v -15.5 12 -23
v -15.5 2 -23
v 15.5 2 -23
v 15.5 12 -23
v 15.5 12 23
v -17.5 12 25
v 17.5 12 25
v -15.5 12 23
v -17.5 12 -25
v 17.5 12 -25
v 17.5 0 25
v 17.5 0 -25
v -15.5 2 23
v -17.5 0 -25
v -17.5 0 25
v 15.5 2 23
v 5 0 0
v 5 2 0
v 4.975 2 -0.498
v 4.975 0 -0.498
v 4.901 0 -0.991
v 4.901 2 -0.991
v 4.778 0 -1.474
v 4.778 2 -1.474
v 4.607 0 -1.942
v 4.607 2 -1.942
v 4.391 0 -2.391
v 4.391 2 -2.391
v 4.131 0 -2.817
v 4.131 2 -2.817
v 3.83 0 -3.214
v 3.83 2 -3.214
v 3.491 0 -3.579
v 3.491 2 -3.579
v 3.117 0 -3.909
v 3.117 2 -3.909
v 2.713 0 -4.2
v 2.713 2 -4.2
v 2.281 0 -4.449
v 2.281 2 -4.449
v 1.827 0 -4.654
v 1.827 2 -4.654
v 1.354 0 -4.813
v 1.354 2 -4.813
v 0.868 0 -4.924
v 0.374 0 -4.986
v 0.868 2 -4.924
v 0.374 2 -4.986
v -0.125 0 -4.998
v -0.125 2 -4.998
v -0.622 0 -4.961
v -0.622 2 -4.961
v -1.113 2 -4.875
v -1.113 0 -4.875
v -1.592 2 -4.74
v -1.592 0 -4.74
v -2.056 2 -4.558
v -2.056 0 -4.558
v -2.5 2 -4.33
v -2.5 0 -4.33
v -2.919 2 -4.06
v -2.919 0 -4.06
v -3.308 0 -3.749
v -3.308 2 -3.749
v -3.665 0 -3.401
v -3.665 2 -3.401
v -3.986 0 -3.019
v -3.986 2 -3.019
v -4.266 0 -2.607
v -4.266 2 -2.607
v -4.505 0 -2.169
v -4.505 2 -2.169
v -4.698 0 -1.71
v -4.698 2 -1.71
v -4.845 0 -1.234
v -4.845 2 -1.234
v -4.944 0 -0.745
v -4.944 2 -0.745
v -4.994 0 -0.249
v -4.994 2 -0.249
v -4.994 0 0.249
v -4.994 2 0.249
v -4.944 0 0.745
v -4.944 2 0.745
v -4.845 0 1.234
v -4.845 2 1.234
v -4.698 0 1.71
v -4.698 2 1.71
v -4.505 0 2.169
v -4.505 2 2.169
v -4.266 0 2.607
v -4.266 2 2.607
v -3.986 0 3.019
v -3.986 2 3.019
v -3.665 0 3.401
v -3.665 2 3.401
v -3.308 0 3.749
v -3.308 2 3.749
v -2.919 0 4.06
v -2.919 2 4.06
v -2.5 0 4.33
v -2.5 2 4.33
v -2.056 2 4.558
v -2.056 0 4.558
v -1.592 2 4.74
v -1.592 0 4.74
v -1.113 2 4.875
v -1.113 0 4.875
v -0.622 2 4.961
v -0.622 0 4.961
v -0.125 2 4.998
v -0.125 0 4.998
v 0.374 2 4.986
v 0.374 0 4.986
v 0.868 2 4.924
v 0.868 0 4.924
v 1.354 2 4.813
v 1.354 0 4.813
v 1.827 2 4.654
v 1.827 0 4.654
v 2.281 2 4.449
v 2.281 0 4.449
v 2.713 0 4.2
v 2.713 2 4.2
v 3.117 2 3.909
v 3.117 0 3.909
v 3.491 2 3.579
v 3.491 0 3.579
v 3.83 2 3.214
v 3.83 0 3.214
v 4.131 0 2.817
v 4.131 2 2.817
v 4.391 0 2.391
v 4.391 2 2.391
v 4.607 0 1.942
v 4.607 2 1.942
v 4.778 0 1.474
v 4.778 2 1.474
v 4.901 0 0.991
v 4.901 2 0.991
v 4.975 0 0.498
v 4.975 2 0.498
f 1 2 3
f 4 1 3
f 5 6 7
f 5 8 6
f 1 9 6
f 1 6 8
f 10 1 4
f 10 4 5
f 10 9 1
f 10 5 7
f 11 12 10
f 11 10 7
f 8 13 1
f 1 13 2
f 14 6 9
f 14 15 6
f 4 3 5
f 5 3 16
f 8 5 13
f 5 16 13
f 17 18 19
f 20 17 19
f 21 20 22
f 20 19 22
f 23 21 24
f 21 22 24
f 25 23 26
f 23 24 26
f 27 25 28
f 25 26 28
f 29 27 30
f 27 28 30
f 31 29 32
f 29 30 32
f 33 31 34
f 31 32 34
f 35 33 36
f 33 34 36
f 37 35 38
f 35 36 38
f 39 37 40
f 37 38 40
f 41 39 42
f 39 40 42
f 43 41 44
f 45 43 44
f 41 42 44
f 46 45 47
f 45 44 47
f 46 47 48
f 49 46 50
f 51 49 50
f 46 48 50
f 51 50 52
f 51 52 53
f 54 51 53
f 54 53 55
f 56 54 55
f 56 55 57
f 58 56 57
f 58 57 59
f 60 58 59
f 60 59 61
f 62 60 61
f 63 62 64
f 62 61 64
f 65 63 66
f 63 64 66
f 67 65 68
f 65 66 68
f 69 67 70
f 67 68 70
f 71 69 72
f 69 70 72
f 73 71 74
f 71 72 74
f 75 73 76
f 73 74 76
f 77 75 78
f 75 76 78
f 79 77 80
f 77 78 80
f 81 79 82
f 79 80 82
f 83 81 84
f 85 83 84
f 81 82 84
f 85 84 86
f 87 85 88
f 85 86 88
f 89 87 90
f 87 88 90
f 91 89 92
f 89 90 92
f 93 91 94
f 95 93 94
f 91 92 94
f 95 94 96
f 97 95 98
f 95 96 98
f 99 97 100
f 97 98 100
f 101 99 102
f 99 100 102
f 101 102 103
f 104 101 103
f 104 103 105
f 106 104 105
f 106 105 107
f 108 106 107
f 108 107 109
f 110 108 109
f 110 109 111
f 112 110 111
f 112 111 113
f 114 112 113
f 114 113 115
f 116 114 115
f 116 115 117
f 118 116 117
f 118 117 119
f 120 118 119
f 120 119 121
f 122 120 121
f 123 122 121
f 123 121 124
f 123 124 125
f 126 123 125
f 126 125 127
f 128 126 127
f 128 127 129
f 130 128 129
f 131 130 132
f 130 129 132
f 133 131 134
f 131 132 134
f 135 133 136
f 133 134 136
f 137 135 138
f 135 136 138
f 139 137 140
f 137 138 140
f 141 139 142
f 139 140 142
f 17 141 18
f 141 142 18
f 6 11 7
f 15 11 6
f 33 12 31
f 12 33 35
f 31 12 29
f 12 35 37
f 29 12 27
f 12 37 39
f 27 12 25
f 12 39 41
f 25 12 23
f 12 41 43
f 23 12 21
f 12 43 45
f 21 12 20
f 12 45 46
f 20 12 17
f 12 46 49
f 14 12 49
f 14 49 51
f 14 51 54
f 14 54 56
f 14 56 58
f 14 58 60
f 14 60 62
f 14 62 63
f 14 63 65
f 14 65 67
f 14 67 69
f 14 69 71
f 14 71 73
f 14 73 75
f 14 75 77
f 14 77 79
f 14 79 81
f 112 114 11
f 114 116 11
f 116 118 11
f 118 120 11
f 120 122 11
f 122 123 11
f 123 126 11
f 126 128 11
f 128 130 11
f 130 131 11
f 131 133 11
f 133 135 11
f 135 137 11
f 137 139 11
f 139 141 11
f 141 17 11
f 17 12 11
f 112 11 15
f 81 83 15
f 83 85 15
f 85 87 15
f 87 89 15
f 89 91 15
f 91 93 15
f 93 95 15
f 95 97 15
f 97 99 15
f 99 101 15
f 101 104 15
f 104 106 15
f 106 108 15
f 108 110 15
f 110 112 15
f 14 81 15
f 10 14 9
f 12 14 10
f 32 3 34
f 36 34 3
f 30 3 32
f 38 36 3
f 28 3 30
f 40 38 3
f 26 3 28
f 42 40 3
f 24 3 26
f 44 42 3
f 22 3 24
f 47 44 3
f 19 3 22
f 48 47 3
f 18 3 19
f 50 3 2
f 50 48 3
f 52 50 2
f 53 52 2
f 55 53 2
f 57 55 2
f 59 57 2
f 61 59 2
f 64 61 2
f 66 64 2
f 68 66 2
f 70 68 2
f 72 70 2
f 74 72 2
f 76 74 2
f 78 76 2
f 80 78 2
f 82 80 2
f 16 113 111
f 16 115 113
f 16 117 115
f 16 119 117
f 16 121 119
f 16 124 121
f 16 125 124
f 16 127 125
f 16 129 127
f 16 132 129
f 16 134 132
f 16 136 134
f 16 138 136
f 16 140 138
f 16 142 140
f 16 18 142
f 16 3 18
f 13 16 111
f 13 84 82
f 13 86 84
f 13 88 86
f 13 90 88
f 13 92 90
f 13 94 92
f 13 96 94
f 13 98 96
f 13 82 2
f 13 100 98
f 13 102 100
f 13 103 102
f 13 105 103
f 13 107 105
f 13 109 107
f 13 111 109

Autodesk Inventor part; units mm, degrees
ref_plane "РабПлоскость1" through (0, -35, 0) normal (0, 1, 0) x (-1, 0, 0)
ref_plane "РабПлоскость25" through (100, -155, 0) normal (-1, 0, 0) x (0, 0, 1)
ref_plane "РабПлоскость26" through (84, -165, -19) normal (-1, 0, 0) x (0, 0, 1)
sketch "Эскиз130" plane through (0, 0, 0) normal (0, 1, 0) x (-1, 0, 0)
  line L0 (-17.5, 25) -> (17.5, 25)
  line L1 (17.5, 25) -> (17.5, -25)
  line L2 (17.5, -25) -> (-17.5, -25)
  line L3 (-17.5, -25) -> (-17.5, 25)
  line L4 (-17.5, 25) -> (17.5, -25) construction
  line L5 (17.5, 25) -> (-17.5, -25) construction
  point P0 (0, 0)
  dimension "d710" = 50
  dimension "d711" = 35
extrude "Выдавливание115" add sketch "Эскиз130" along normal blind 2
sketch "Эскиз131" plane through (0, 2, 0) normal (0, 1, 0) x (1, 0, 0)
  line L0 (15.5, -23) -> (-15.5, -23)
  line L1 (-15.5, -23) -> (-15.5, 23)
  line L2 (-15.5, 23) -> (15.5, 23)
  line L3 (15.5, 23) -> (15.5, -23)
  line L4 (15.5, -23) -> (-15.5, 23) construction
  line L5 (-15.5, -23) -> (15.5, 23) construction
  line L6 (-17.5, 25) -> (-17.5, -25) projected
  line L7 (17.5, 25) -> (-17.5, 25) projected
  line L8 (-17.5, -25) -> (17.5, -25) projected
  line L9 (17.5, -25) -> (17.5, 25) projected
  line L10 (-17.5, -25) -> (17.5, -25) projected
  line L11 (17.5, -25) -> (17.5, 25) projected
  line L12 (17.5, 25) -> (-17.5, 25) projected
  line L13 (-17.5, 25) -> (-17.5, -25) projected
  point P0 (0, 0)
  dimension "d714" = 2
  dimension "d715" = 2
extrude "Выдавливание116" add sketch "Эскиз131" along normal blind 10
sketch "Эскиз132" plane through (0, 2, 0) normal (0, 1, 0) x (1, 0, 0)
  circle A0 centre (0, 0) radius 5
  dimension "d718" = 10
  dimension "d12" = 100
  dimension "d14" = 17
  dimension "d26" = 5
extrude "Выдавливание117" cut sketch "Эскиз132" against normal blind 10
sketch "Эскиз6" plane through (0, -35, -85) normal (0, -1, 0) x (1, 0, 0)
  arc A0 (29.3991, 164.4544) -> (0, 170) centre (-5, 62.7941) ccw projected
  line L0 (0, 170) -> (0, 0) projected
  arc A1 (0, 0) -> (29.3991, 5.5456) centre (-5, 107.2059) ccw projected
  arc A2 (29.3991, 5.5456) -> (100, 85) centre (-5, 107.2059) ccw projected
  arc A3 (100, 85) -> (29.3991, 164.4544) centre (-5, 62.7941) ccw projected
  point P0 (0, 85)
sketch "Эскиз114" plane through (2, -165, 82.8837) normal (1, 0, 0) x (0, 0, -1)
  circle A0 centre (120.1897, 5) radius 1
  line L0 (-2.1163, 0) -> (167.8837, 0) construction
  line L1 (82.8837, 0) -> (82.8837, 60.2174) construction
  circle A1 centre (45.5777, 5) radius 1
  point P0 (82.8837, 165)
  dimension "d609" = 2
  dimension "d610" = 37.306
  dimension "d611" = 5
sketch "Эскиз115" plane through (2, -165, 82.8837) normal (1, 0, 0) x (0, 0, -1)
  line L0 (167.7717, 0) -> (0, 0) construction
  line L1 (82.8837, 130) -> (82.8837, 0) construction
  line L2 (63.8837, 0) -> (101.8837, 0)
  line L3 (101.8837, 0) -> (101.8837, 20)
  line L4 (101.8837, 20) -> (63.8837, 20)
  line L5 (63.8837, 20) -> (63.8837, 0)
  line L6 (65.8837, 2) -> (99.8837, 2)
  line L7 (99.8837, 2) -> (99.8837, 18)
  line L8 (99.8837, 18) -> (65.8837, 18)
  line L9 (65.8837, 18) -> (65.8837, 2)
  line L10 (65.8837, 2) -> (99.8837, 18) construction
  line L11 (99.8837, 2) -> (65.8837, 18) construction
  point P0 (82.8837, 165)
  point P1 (145.8837, 0)
  point P2 (82.8837, 20)
  point P3 (82.8837, 10)
  dimension "d614" = 38
  dimension "d615" = 20
  dimension "d616" = 2
  dimension "d617" = 2
  dimension "d618" = 2
sketch "Эскиз116" plane through (0, -165, -85) normal (0, -1, 0) x (1, 0, 0)
  arc A0 (91.9272, 104) -> (2, 167.8837) centre (-5, 62.7941) ccw construction
  arc A1 (97.9549, 85) -> (92.7533, 102) centre (-5, 62.7941) ccw construction
  arc A2 (97.9549, 85) -> (91.9272, 104) centre (-5, 62.7941) ccw construction
  arc A3 (91.9272, 66) -> (97.9549, 85) centre (-5, 107.206) ccw
  line L0 (2, 66) -> (100.2736, 66) construction
  arc A4 (100.2736, 66) -> (97.9549, 85) centre (-5, 62.7941) ccw projected
  line L1 (91.9272, 66) -> (100.2736, 66)
  point P0 (0, 85)
  point P1 (36.5, 159.5958)
  dimension "d621" = 22.206
sketch "Эскиз117" plane through (2, -165, 82.8837) normal (1, 0, 0) x (0, 0, -1)
  line L0 (101.8837, 20) -> (101.8837, 0) projected
  line L1 (63.8837, 20) -> (101.8837, 20) projected
  line L2 (63.8837, 0) -> (63.8837, 20) projected
  line L3 (63.8837, 0) -> (101.8837, 0)
  point P0 (82.8837, 165)
sketch "Эскиз118" plane through (0, -165, -85) normal (0, -1, 0) x (1, 0, 0)
  line L0 (2, 66) -> (2, 104) projected
  line L1 (2, 66) -> (91.9272, 66) projected
  arc A0 (91.9272, 66) -> (97.9549, 85) centre (-5, 107.206) ccw projected
  line L2 (97.9549, 85) -> (100, 85) projected
  arc A1 (100, 85) -> (94.0968, 104) centre (-5, 62.7941) ccw projected
  line L3 (2, 104) -> (94.0968, 104) projected
  line L4 (2, 104) -> (4, 104)
  line L5 (4, 104) -> (4, 66)
  line L6 (4, 66) -> (2, 66)
  line L7 (2, 66) -> (2, 104)
  point P0 (0, 85)
  dimension "d626" = 2
sketch "Эскиз119" plane through (0, -165, -85) normal (0, -1, 0) x (1, 0, 0)
  arc A0 (100, 85) -> (94.0968, 104) centre (-5, 62.7941) ccw construction
  line L0 (4, 104) -> (4, 66) construction
  line L1 (4, 85) -> (65.3021, 85) construction
  arc A1 (94.0968, 66) -> (100, 85) centre (-5, 107.2059) ccw
  arc A2 (91.9272, 66) -> (97.9549, 85) centre (-5, 107.206) ccw construction
  line L2 (100, 85) -> (97.9549, 85)
  line L3 (94.0968, 66) -> (91.9272, 66)
  arc A3 (91.9272, 66) -> (97.9549, 85) centre (-5, 107.206) ccw
  point P0 (0, 85)
sketch "Эскиз120" plane through (4, -147, 17) normal (0, -1, 0) x (1, 0, 0)
  line L0 (0, 0) -> (2, 0)
  line L1 (2, 0) -> (2, -34)
  line L2 (2, -34) -> (0, -34)
  line L3 (0, -34) -> (0, 0)
  point P0 (-4, -17)
  dimension "d631" = 2
sketch "Эскиз121" plane through (0, 0, 0) normal (1, 0, 0) x (0, 1, 0)
  line L0 (-145, -19) -> (-145, 19) construction
  line L1 (-165, -19) -> (-145, -19) construction
  line L2 (-165, 19) -> (-165, -19) construction
  line L3 (-145, 19) -> (-165, 19) construction
  line L4 (-158, -19) -> (-152, -19)
  line L5 (-152, -19) -> (-152, -25)
  line L6 (-152, -25) -> (-158, -25)
  line L7 (-158, -25) -> (-158, -19)
  circle A0 centre (-155, -22) radius 1
  line L8 (-158, 25) -> (-152, 25)
  line L9 (-152, 25) -> (-152, 19)
  line L10 (-152, 19) -> (-158, 19)
  line L11 (-158, 19) -> (-158, 25)
  circle A1 centre (-155, 22) radius 1
  line L12 (-155, 19) -> (-155, -19) construction
  point P0 (0, 0)
  dimension "d634" = 6
  dimension "d635" = 6
  dimension "d636" = 2
  dimension "d637" = 3
  dimension "d638" = 3
  dimension "d639" = 6
  dimension "d640" = 6
  dimension "d641" = 2
  dimension "d642" = 3
  dimension "d643" = 3
sketch "Эскиз122" plane through (0, -158, 19) normal (0, -1, 0) x (1, 0, 0)
  line L0 (0, 0) -> (0, 6) projected
  line L1 (0, 0) -> (4, 0) projected
  line L2 (6, 0) -> (4, 0) projected
  line L3 (6, 6) -> (6, 0) projected
  line L4 (0, 6) -> (6, 6) projected
  line L5 (0, -44) -> (0, -38) projected
  line L6 (0, -44) -> (6, -44) projected
  line L7 (6, -38) -> (6, -44) projected
  line L8 (4, -38) -> (6, -38) projected
  line L9 (0, -38) -> (4, -38) projected
  line L10 (0, 6) -> (4, 6)
  line L11 (4, 6) -> (4, -44)
  line L12 (4, -44) -> (0, -44)
  line L13 (0, -44) -> (0, 6)
  line L14 (0, -44) -> (6, -44) projected
  point P0 (0, -19)
  dimension "d646" = 4
sketch "Эскиз123" plane through (0, -165, -85) normal (0, -1, 0) x (1, 0, 0)
  line L0 (32, 66) -> (34, 66)
  line L1 (34, 66) -> (34, 63)
  line L2 (34, 63) -> (32, 63)
  line L3 (32, 63) -> (32, 66)
  line L4 (4, 104) -> (4, 66) projected
  line L5 (94.0968, 66) -> (4, 66) projected
  line L6 (32, 107) -> (34, 107)
  line L7 (34, 107) -> (34, 104)
  line L8 (34, 104) -> (32, 104)
  line L9 (32, 104) -> (32, 107)
  line L10 (4, 104) -> (94.0968, 104) projected
  line L11 (36.5, 107) -> (38.5, 107)
  line L12 (38.5, 107) -> (38.5, 104)
  line L13 (38.5, 104) -> (36.5, 104)
  line L14 (36.5, 104) -> (36.5, 107)
  line L15 (36.5, 66) -> (38.5, 66)
  line L16 (38.5, 66) -> (38.5, 63)
  line L17 (38.5, 63) -> (36.5, 63)
  line L18 (36.5, 63) -> (36.5, 66)
  point P0 (0, 85)
  dimension "d650" = 30
  dimension "d651" = 2
  dimension "d652" = 3
  dimension "d653" = 2
  dimension "d654" = 3
  dimension "d655" = 2
  dimension "d656" = 3
  dimension "d657" = 2
  dimension "d658" = 3
  dimension "d659" = 30
  dimension "d660" = 2.5
  dimension "d661" = 2.5
sketch "Эскиз124" plane through (36.5, -145, -19) normal (0, 0, 1) x (1, 0, 0)
  line L0 (0, 0) -> (2, 0) projected
  line L1 (2, 0) -> (2, 2) projected
  line L2 (0, 2) -> (2, 2) projected
  line L3 (0, 0) -> (0, 2) projected
  line L4 (-4.5, 0) -> (-2.5, 0) projected
  line L5 (-2.5, 0) -> (-2.5, 2) projected
  line L6 (-4.5, 2) -> (-2.5, 2) projected
  line L7 (-4.5, 0) -> (-4.5, 2) projected
  point P0 (-36.5, 145)
  dimension "d667" = 2
  dimension "d668" = 9.5
  dimension "d669" = 10
sketch "Эскиз126" plane through (0, -165, -85) normal (0, -1, 0) x (1, 0, 0)
  circle A0 centre (16, 79) radius 1
  circle A1 centre (16, 91) radius 1
  line L0 (4, 104) -> (4, 66) projected
  line L1 (4, 85) -> (100.0263, 85) construction
  circle A2 centre (31, 79) radius 1
  circle A3 centre (31, 91) radius 1
  circle A4 centre (71, 75) radius 1
  circle A5 centre (71, 95) radius 1
  point P0 (0, 85)
  dimension "d674" = 2
  dimension "d675" = 2
  dimension "d676" = 12
  dimension "d677" = 12
  dimension "d678" = 6
  dimension "d679" = 2
  dimension "d680" = 2
  dimension "d681" = 12
  dimension "d683" = 27
  dimension "d684" = 6
  dimension "d685" = 2
  dimension "d686" = 2
  dimension "d689" = 67
  dimension "d690" = 10
  dimension "d697" = 20
sketch "Эскиз127" plane through (0, -165, -85) normal (0, -1, 0) x (1, 0, 0)
  circle A0 centre (71, 75) radius 1 construction
  circle A1 centre (31, 79) radius 1 construction
  circle A2 centre (16, 79) radius 1 construction
  circle A3 centre (16, 91) radius 1 construction
  circle A4 centre (31, 91) radius 1 construction
  circle A5 centre (71, 95) radius 1 construction
  arc A6 (32, 64) -> (34, 64) centre (33, 64) ccw construction
  line L0 (34, 64) -> (34, 66) construction
  line L1 (36.5, 66) -> (34, 66) construction
  line L2 (36.5, 66) -> (36.5, 64) construction
  arc A7 (36.5, 64) -> (38.5, 64) centre (37.5, 64) ccw construction
  line L3 (38.5, 64) -> (38.5, 66) construction
  line L4 (94.0968, 66) -> (38.5, 66) construction
  arc A8 (94.0968, 66) -> (100, 85) centre (-5, 107.2059) ccw projected
  arc A9 (100, 85) -> (94.0968, 104) centre (-5, 62.7941) ccw projected
  line L5 (38.5, 104) -> (94.0968, 104) construction
  line L6 (38.5, 104) -> (38.5, 106) construction
  arc A10 (38.5, 106) -> (36.5, 106) centre (37.5, 106) ccw construction
  line L7 (36.5, 106) -> (36.5, 104) construction
  line L8 (34, 104) -> (36.5, 104) construction
  line L9 (34, 104) -> (34, 106) construction
  arc A11 (34, 106) -> (32, 106) centre (33, 106) ccw construction
  line L10 (32, 106) -> (32, 104) construction
  line L11 (4, 104) -> (32, 104) construction
  line L12 (4, 104) -> (4, 66) construction
  line L13 (32, 66) -> (4, 66) construction
  line L14 (32, 66) -> (32, 64) construction
  line L15 (4, 85) -> (100, 85) construction
  line L16 (4, 84) -> (99.7835, 84)
  line L17 (4, 86) -> (99.7835, 86)
  line L18 (4, 86) -> (4, 84)
  point P0 (0, 85)
  dimension "d693" = 2
  dimension "d694" = 1
sketch "Эскиз128" plane through (84, -165, -19) normal (-1, 0, 0) x (0, 0, 1)
  line L0 (-7, 0) -> (46, 0)
  line L1 (46, 0) -> (46, 24)
  line L2 (46, 24) -> (-7, 24)
  line L3 (-7, 24) -> (-7, 0)
  point P0 (19, 165)
  point P1 (0, 0)
  dimension "d699" = 53
  dimension "d700" = 24
  dimension "d701" = 7
sketch "Эскиз129" plane through (38.5, -145, 19) normal (0, 1, 0) x (1, 0, 0)
  arc A0 (45.5, 48) -> (45.5, -10) centre (79.9093, 19) ccw
  line L0 (45.5, 48) -> (45.5, -10)
  line L1 (45.5, 0) -> (45.5, 38) projected
  line L2 (0, 0) -> (45.5, 0) projected
  point P0 (-38.5, 19)
  dimension "d707" = 10
  dimension "d708" = 10
  dimension "d709" = 45
  dimension "d10" = 170
  dimension "d15" = 4
  dimension "d16" = 35
  dimension "d97" = 2
properties part number "тело"
